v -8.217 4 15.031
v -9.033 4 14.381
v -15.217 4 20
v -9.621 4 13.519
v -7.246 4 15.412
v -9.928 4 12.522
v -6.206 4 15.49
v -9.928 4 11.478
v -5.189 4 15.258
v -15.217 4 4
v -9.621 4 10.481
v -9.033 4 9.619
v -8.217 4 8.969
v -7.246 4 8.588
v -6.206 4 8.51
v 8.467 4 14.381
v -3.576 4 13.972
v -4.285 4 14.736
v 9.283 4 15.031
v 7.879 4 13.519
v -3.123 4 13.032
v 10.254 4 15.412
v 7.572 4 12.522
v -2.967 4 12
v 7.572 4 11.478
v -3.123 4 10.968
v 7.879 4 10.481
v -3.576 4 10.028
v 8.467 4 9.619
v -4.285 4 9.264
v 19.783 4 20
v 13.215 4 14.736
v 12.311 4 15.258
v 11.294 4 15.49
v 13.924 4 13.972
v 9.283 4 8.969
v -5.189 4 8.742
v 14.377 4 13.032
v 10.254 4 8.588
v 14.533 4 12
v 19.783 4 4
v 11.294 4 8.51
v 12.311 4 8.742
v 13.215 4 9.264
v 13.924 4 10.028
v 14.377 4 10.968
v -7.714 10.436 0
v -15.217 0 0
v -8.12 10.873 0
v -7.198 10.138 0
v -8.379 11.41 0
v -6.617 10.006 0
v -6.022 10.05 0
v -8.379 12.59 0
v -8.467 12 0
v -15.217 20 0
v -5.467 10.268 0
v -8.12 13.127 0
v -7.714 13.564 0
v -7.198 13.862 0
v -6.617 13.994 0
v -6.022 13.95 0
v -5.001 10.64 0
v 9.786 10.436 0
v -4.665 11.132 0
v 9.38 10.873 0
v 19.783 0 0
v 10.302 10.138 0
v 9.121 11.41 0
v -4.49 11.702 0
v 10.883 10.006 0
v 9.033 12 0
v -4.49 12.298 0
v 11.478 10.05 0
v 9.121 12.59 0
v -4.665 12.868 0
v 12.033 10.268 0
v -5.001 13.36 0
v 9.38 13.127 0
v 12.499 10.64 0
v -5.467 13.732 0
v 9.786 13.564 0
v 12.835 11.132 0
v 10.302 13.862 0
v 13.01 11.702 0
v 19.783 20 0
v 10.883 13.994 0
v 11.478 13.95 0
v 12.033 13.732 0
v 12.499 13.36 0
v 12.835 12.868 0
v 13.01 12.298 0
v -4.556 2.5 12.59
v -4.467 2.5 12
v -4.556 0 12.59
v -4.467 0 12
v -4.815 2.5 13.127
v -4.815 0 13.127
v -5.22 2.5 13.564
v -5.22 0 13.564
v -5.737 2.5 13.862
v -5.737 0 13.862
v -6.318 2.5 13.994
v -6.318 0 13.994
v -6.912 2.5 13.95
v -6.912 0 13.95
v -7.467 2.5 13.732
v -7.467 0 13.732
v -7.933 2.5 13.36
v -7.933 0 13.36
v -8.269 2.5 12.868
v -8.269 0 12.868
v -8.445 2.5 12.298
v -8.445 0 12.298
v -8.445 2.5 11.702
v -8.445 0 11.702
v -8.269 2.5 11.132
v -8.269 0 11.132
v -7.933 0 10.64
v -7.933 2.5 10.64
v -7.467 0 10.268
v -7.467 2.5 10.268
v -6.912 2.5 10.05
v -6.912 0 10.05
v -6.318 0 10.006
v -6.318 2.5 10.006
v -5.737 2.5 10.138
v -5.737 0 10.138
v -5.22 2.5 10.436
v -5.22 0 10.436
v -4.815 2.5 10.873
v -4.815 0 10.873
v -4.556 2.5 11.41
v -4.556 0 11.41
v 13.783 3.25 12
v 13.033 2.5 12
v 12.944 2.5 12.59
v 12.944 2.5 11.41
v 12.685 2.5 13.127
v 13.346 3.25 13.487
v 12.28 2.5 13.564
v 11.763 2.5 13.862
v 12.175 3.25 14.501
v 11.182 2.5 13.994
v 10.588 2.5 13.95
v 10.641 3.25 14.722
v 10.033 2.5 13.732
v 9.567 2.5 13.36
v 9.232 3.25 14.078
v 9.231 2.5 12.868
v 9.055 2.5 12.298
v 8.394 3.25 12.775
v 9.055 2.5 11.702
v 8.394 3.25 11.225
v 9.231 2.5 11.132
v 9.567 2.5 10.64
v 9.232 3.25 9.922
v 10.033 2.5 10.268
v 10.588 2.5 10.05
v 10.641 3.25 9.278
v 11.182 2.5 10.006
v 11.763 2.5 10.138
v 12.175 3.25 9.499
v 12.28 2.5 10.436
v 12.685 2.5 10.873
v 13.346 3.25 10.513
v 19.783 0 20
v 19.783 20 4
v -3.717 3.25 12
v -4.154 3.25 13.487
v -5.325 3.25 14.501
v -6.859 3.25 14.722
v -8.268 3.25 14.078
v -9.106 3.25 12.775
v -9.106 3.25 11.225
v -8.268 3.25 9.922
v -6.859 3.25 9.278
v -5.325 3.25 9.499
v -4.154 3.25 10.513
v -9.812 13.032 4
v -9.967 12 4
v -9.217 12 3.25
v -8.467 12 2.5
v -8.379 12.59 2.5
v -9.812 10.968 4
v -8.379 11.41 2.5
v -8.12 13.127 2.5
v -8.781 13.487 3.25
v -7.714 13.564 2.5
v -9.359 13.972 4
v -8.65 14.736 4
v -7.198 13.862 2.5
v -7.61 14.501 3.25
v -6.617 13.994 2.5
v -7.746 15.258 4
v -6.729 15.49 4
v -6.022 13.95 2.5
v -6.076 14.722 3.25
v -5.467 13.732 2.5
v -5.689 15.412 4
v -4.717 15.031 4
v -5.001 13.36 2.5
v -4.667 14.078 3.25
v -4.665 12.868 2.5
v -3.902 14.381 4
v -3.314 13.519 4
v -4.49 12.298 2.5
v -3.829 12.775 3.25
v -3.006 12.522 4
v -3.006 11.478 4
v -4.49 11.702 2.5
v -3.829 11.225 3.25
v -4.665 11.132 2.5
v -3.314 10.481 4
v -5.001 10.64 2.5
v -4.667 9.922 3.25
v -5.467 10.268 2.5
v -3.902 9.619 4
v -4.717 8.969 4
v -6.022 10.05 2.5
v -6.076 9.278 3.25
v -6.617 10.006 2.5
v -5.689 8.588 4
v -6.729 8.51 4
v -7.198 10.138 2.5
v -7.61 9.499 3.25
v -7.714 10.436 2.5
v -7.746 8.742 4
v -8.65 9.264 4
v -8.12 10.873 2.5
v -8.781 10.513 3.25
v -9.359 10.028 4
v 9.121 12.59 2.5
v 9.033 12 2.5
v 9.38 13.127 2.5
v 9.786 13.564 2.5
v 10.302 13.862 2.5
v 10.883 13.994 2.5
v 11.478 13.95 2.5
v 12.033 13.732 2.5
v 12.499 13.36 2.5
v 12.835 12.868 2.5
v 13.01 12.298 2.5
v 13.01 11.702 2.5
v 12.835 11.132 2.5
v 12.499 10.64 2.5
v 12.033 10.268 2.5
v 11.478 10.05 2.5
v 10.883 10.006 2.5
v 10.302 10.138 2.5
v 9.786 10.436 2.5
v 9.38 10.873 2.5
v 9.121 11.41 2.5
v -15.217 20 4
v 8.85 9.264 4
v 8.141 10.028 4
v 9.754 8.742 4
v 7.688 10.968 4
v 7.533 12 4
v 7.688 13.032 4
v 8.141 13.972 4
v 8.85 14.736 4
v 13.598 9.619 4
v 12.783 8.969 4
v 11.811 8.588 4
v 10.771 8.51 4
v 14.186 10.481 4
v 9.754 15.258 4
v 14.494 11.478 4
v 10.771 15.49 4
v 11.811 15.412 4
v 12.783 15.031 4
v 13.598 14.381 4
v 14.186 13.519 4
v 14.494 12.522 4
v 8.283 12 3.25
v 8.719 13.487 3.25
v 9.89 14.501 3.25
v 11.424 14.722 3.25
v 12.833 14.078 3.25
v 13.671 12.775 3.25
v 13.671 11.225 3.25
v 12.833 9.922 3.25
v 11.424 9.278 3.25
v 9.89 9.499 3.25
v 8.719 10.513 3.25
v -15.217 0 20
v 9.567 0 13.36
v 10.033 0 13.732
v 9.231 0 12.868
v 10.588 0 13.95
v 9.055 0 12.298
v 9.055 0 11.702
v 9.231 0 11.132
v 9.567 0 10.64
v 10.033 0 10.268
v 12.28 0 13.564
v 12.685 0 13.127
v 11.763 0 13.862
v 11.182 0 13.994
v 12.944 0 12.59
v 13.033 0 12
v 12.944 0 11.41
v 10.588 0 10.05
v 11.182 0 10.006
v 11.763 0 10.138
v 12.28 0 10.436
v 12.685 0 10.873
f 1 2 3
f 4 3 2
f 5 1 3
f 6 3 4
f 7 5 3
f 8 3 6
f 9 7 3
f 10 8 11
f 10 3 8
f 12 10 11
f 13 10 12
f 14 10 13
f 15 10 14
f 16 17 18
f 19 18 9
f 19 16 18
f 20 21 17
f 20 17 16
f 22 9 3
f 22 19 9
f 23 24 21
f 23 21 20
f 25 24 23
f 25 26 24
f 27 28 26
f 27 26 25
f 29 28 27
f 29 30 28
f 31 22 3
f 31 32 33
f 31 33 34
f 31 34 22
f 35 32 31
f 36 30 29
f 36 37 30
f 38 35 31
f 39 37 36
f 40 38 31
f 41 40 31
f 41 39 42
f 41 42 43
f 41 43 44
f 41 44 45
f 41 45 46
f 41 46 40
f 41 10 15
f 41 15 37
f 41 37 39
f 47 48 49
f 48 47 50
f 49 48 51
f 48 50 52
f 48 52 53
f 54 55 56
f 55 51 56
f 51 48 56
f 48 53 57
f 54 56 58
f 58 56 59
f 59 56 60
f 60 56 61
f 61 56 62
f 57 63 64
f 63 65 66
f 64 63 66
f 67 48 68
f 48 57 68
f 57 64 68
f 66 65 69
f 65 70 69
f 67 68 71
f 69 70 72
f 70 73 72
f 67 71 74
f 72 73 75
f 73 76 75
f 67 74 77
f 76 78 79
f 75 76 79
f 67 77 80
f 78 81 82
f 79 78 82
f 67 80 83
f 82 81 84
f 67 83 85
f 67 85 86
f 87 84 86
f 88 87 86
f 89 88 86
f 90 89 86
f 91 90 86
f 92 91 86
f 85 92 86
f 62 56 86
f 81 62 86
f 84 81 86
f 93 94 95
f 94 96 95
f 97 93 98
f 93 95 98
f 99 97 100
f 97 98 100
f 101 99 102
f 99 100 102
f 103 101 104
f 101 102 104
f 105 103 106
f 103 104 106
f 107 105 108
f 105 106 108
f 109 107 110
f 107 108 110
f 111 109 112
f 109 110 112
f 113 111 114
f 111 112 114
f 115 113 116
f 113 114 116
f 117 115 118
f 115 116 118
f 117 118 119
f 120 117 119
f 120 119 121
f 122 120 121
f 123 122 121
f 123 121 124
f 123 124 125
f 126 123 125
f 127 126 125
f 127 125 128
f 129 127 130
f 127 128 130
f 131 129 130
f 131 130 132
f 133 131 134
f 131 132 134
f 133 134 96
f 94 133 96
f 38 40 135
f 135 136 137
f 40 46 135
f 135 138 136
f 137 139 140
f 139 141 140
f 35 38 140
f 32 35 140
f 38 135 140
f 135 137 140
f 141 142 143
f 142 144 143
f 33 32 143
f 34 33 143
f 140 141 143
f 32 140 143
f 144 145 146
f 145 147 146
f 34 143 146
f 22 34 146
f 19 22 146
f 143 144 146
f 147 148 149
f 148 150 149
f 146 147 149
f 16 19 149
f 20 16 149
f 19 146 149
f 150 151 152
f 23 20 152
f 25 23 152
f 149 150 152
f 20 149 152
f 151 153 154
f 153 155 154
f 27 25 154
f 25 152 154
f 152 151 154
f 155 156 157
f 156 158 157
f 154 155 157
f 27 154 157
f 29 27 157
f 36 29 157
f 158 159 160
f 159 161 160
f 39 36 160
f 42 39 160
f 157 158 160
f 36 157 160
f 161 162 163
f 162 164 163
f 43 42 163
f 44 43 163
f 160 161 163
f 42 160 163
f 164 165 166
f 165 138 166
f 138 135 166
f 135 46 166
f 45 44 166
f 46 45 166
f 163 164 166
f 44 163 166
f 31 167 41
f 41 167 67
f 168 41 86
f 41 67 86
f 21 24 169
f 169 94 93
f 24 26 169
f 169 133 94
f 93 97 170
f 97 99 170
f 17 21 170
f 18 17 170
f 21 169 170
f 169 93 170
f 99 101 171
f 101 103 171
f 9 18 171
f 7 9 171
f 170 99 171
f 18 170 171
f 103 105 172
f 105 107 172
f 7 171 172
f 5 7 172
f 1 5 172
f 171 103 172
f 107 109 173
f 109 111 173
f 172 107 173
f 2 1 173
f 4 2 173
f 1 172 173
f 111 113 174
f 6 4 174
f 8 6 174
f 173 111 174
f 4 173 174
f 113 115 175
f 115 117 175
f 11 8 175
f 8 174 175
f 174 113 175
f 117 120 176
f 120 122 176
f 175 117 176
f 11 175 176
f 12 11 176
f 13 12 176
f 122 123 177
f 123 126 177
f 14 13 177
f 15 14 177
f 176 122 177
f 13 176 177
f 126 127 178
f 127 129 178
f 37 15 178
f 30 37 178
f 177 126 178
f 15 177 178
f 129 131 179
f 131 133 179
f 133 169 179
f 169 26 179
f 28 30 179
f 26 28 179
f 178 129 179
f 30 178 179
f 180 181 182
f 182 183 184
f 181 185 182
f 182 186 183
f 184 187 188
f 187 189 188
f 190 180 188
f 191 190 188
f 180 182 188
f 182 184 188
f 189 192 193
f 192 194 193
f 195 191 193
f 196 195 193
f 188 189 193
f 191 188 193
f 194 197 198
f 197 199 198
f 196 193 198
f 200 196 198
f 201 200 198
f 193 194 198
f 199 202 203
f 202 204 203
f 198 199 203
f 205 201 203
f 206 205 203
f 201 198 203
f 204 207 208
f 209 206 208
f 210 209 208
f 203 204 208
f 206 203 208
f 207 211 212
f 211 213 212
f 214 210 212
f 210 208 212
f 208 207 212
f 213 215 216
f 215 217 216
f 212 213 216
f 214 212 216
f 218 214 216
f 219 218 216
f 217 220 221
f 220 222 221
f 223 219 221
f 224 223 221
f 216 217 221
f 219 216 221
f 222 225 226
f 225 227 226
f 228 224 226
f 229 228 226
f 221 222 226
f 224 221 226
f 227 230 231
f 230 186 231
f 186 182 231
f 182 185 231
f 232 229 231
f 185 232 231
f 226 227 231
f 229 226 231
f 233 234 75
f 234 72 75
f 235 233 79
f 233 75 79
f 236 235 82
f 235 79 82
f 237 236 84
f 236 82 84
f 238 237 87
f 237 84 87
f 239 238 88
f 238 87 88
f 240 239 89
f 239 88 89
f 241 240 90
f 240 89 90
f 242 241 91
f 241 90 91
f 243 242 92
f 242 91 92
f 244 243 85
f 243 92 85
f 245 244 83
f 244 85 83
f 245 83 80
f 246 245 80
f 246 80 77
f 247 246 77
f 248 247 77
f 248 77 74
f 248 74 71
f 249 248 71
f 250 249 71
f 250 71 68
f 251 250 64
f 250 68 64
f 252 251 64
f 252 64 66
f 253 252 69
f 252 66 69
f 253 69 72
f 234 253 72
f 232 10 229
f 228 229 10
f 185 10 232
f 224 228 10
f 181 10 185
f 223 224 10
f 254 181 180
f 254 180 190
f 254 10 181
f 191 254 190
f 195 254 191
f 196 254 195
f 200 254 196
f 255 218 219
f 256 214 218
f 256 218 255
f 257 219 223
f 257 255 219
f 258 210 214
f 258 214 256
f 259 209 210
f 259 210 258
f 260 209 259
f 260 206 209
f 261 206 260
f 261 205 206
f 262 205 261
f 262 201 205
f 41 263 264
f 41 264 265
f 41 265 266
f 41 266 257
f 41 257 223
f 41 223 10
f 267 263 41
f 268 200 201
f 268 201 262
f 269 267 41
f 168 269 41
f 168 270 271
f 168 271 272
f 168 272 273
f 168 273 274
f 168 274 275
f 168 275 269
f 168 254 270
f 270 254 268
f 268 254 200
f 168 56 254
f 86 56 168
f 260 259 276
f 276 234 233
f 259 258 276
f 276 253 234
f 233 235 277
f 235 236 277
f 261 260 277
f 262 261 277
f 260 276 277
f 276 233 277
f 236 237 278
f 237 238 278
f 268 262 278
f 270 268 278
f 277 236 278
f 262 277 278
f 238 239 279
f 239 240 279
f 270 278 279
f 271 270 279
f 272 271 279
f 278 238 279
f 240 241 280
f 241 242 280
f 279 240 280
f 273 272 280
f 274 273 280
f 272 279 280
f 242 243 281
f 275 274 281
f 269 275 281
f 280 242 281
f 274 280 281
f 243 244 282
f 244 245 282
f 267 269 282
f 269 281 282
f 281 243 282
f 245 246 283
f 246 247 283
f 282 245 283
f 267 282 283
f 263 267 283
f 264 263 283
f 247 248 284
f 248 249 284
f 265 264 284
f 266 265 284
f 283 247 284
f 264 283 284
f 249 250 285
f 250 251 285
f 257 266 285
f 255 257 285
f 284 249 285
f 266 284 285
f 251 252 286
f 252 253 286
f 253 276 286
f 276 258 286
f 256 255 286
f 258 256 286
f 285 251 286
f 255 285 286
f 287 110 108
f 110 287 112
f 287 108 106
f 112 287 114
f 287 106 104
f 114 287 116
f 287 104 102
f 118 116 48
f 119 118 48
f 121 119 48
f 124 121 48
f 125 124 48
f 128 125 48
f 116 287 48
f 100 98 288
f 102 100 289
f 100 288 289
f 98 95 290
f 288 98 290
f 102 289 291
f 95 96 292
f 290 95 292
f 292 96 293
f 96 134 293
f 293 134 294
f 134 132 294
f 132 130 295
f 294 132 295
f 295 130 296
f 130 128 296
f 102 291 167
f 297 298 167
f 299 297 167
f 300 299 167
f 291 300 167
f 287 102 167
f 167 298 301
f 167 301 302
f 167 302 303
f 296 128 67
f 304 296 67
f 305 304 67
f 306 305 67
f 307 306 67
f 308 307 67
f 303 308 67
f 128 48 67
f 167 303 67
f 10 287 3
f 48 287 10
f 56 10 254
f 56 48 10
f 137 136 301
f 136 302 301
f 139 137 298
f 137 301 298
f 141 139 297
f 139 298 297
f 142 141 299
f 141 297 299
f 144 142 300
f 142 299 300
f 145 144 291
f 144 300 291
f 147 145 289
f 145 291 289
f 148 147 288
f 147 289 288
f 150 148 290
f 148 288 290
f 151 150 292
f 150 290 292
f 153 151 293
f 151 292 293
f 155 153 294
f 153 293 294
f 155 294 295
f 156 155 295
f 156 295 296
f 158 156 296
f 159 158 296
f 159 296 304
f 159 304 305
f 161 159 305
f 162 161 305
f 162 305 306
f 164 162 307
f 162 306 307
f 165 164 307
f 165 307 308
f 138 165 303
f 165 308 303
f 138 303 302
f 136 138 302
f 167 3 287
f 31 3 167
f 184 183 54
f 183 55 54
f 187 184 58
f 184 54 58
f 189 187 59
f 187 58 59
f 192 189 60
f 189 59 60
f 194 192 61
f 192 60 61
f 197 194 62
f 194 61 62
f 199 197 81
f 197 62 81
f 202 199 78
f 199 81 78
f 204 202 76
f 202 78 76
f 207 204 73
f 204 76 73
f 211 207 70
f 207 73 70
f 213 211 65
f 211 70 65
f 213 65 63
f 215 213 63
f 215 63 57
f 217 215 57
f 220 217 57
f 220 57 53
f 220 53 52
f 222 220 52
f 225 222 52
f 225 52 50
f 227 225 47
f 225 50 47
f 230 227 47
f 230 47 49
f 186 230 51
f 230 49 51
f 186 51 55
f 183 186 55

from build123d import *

# Parameters (mm, degrees)
F0_W                 = 35
F0_H                 = 20
F1_DEPTH             = 4
F2_W                 = 35
F2_H                 = 4
F3_DEPTH             = 16
F6_D                 = 4
F6_CSINK_D           = 7
F6_CSINK_ANGLE       = 90
F6_ON_F4_D           = 4
F6_ON_F4_CSINK_D     = 7
F6_ON_F4_CSINK_ANGLE = 90


with BuildPart() as f1:
    # F0 (on Top) → F1 (new body)
    with BuildSketch(Plane.XY):
        with Locations((2.2826059621, 10)):
            Rectangle(F0_W, F0_H)
    extrude(amount=F1_DEPTH)

    # F2 (on face) → F3 (join)
    with BuildSketch(Plane.XY.offset(4)):
        with Locations((2.2826059621, 2)):
            Rectangle(F2_W, F2_H)
    extrude(amount=F3_DEPTH)

    # F6 (through all)
    with Locations(Plane.XY.offset(4)):
        with Locations((11.0326059621, 12), (-6.4673940379, 12)):
            CounterSinkHole(F6_D / 2, F6_CSINK_D / 2, counter_sink_angle=F6_CSINK_ANGLE)

    # F6 on F4 (through all)
    with Locations(Plane(origin=(0, 4, 0), x_dir=(-1, 0, 0), z_dir=(0, 1, 0))):
        with Locations((6.4673940379, 12), (-11.0326059621, 12)):
            CounterSinkHole(F6_ON_F4_D / 2, F6_ON_F4_CSINK_D / 2, counter_sink_angle=F6_ON_F4_CSINK_ANGLE)


solid = f1.part
